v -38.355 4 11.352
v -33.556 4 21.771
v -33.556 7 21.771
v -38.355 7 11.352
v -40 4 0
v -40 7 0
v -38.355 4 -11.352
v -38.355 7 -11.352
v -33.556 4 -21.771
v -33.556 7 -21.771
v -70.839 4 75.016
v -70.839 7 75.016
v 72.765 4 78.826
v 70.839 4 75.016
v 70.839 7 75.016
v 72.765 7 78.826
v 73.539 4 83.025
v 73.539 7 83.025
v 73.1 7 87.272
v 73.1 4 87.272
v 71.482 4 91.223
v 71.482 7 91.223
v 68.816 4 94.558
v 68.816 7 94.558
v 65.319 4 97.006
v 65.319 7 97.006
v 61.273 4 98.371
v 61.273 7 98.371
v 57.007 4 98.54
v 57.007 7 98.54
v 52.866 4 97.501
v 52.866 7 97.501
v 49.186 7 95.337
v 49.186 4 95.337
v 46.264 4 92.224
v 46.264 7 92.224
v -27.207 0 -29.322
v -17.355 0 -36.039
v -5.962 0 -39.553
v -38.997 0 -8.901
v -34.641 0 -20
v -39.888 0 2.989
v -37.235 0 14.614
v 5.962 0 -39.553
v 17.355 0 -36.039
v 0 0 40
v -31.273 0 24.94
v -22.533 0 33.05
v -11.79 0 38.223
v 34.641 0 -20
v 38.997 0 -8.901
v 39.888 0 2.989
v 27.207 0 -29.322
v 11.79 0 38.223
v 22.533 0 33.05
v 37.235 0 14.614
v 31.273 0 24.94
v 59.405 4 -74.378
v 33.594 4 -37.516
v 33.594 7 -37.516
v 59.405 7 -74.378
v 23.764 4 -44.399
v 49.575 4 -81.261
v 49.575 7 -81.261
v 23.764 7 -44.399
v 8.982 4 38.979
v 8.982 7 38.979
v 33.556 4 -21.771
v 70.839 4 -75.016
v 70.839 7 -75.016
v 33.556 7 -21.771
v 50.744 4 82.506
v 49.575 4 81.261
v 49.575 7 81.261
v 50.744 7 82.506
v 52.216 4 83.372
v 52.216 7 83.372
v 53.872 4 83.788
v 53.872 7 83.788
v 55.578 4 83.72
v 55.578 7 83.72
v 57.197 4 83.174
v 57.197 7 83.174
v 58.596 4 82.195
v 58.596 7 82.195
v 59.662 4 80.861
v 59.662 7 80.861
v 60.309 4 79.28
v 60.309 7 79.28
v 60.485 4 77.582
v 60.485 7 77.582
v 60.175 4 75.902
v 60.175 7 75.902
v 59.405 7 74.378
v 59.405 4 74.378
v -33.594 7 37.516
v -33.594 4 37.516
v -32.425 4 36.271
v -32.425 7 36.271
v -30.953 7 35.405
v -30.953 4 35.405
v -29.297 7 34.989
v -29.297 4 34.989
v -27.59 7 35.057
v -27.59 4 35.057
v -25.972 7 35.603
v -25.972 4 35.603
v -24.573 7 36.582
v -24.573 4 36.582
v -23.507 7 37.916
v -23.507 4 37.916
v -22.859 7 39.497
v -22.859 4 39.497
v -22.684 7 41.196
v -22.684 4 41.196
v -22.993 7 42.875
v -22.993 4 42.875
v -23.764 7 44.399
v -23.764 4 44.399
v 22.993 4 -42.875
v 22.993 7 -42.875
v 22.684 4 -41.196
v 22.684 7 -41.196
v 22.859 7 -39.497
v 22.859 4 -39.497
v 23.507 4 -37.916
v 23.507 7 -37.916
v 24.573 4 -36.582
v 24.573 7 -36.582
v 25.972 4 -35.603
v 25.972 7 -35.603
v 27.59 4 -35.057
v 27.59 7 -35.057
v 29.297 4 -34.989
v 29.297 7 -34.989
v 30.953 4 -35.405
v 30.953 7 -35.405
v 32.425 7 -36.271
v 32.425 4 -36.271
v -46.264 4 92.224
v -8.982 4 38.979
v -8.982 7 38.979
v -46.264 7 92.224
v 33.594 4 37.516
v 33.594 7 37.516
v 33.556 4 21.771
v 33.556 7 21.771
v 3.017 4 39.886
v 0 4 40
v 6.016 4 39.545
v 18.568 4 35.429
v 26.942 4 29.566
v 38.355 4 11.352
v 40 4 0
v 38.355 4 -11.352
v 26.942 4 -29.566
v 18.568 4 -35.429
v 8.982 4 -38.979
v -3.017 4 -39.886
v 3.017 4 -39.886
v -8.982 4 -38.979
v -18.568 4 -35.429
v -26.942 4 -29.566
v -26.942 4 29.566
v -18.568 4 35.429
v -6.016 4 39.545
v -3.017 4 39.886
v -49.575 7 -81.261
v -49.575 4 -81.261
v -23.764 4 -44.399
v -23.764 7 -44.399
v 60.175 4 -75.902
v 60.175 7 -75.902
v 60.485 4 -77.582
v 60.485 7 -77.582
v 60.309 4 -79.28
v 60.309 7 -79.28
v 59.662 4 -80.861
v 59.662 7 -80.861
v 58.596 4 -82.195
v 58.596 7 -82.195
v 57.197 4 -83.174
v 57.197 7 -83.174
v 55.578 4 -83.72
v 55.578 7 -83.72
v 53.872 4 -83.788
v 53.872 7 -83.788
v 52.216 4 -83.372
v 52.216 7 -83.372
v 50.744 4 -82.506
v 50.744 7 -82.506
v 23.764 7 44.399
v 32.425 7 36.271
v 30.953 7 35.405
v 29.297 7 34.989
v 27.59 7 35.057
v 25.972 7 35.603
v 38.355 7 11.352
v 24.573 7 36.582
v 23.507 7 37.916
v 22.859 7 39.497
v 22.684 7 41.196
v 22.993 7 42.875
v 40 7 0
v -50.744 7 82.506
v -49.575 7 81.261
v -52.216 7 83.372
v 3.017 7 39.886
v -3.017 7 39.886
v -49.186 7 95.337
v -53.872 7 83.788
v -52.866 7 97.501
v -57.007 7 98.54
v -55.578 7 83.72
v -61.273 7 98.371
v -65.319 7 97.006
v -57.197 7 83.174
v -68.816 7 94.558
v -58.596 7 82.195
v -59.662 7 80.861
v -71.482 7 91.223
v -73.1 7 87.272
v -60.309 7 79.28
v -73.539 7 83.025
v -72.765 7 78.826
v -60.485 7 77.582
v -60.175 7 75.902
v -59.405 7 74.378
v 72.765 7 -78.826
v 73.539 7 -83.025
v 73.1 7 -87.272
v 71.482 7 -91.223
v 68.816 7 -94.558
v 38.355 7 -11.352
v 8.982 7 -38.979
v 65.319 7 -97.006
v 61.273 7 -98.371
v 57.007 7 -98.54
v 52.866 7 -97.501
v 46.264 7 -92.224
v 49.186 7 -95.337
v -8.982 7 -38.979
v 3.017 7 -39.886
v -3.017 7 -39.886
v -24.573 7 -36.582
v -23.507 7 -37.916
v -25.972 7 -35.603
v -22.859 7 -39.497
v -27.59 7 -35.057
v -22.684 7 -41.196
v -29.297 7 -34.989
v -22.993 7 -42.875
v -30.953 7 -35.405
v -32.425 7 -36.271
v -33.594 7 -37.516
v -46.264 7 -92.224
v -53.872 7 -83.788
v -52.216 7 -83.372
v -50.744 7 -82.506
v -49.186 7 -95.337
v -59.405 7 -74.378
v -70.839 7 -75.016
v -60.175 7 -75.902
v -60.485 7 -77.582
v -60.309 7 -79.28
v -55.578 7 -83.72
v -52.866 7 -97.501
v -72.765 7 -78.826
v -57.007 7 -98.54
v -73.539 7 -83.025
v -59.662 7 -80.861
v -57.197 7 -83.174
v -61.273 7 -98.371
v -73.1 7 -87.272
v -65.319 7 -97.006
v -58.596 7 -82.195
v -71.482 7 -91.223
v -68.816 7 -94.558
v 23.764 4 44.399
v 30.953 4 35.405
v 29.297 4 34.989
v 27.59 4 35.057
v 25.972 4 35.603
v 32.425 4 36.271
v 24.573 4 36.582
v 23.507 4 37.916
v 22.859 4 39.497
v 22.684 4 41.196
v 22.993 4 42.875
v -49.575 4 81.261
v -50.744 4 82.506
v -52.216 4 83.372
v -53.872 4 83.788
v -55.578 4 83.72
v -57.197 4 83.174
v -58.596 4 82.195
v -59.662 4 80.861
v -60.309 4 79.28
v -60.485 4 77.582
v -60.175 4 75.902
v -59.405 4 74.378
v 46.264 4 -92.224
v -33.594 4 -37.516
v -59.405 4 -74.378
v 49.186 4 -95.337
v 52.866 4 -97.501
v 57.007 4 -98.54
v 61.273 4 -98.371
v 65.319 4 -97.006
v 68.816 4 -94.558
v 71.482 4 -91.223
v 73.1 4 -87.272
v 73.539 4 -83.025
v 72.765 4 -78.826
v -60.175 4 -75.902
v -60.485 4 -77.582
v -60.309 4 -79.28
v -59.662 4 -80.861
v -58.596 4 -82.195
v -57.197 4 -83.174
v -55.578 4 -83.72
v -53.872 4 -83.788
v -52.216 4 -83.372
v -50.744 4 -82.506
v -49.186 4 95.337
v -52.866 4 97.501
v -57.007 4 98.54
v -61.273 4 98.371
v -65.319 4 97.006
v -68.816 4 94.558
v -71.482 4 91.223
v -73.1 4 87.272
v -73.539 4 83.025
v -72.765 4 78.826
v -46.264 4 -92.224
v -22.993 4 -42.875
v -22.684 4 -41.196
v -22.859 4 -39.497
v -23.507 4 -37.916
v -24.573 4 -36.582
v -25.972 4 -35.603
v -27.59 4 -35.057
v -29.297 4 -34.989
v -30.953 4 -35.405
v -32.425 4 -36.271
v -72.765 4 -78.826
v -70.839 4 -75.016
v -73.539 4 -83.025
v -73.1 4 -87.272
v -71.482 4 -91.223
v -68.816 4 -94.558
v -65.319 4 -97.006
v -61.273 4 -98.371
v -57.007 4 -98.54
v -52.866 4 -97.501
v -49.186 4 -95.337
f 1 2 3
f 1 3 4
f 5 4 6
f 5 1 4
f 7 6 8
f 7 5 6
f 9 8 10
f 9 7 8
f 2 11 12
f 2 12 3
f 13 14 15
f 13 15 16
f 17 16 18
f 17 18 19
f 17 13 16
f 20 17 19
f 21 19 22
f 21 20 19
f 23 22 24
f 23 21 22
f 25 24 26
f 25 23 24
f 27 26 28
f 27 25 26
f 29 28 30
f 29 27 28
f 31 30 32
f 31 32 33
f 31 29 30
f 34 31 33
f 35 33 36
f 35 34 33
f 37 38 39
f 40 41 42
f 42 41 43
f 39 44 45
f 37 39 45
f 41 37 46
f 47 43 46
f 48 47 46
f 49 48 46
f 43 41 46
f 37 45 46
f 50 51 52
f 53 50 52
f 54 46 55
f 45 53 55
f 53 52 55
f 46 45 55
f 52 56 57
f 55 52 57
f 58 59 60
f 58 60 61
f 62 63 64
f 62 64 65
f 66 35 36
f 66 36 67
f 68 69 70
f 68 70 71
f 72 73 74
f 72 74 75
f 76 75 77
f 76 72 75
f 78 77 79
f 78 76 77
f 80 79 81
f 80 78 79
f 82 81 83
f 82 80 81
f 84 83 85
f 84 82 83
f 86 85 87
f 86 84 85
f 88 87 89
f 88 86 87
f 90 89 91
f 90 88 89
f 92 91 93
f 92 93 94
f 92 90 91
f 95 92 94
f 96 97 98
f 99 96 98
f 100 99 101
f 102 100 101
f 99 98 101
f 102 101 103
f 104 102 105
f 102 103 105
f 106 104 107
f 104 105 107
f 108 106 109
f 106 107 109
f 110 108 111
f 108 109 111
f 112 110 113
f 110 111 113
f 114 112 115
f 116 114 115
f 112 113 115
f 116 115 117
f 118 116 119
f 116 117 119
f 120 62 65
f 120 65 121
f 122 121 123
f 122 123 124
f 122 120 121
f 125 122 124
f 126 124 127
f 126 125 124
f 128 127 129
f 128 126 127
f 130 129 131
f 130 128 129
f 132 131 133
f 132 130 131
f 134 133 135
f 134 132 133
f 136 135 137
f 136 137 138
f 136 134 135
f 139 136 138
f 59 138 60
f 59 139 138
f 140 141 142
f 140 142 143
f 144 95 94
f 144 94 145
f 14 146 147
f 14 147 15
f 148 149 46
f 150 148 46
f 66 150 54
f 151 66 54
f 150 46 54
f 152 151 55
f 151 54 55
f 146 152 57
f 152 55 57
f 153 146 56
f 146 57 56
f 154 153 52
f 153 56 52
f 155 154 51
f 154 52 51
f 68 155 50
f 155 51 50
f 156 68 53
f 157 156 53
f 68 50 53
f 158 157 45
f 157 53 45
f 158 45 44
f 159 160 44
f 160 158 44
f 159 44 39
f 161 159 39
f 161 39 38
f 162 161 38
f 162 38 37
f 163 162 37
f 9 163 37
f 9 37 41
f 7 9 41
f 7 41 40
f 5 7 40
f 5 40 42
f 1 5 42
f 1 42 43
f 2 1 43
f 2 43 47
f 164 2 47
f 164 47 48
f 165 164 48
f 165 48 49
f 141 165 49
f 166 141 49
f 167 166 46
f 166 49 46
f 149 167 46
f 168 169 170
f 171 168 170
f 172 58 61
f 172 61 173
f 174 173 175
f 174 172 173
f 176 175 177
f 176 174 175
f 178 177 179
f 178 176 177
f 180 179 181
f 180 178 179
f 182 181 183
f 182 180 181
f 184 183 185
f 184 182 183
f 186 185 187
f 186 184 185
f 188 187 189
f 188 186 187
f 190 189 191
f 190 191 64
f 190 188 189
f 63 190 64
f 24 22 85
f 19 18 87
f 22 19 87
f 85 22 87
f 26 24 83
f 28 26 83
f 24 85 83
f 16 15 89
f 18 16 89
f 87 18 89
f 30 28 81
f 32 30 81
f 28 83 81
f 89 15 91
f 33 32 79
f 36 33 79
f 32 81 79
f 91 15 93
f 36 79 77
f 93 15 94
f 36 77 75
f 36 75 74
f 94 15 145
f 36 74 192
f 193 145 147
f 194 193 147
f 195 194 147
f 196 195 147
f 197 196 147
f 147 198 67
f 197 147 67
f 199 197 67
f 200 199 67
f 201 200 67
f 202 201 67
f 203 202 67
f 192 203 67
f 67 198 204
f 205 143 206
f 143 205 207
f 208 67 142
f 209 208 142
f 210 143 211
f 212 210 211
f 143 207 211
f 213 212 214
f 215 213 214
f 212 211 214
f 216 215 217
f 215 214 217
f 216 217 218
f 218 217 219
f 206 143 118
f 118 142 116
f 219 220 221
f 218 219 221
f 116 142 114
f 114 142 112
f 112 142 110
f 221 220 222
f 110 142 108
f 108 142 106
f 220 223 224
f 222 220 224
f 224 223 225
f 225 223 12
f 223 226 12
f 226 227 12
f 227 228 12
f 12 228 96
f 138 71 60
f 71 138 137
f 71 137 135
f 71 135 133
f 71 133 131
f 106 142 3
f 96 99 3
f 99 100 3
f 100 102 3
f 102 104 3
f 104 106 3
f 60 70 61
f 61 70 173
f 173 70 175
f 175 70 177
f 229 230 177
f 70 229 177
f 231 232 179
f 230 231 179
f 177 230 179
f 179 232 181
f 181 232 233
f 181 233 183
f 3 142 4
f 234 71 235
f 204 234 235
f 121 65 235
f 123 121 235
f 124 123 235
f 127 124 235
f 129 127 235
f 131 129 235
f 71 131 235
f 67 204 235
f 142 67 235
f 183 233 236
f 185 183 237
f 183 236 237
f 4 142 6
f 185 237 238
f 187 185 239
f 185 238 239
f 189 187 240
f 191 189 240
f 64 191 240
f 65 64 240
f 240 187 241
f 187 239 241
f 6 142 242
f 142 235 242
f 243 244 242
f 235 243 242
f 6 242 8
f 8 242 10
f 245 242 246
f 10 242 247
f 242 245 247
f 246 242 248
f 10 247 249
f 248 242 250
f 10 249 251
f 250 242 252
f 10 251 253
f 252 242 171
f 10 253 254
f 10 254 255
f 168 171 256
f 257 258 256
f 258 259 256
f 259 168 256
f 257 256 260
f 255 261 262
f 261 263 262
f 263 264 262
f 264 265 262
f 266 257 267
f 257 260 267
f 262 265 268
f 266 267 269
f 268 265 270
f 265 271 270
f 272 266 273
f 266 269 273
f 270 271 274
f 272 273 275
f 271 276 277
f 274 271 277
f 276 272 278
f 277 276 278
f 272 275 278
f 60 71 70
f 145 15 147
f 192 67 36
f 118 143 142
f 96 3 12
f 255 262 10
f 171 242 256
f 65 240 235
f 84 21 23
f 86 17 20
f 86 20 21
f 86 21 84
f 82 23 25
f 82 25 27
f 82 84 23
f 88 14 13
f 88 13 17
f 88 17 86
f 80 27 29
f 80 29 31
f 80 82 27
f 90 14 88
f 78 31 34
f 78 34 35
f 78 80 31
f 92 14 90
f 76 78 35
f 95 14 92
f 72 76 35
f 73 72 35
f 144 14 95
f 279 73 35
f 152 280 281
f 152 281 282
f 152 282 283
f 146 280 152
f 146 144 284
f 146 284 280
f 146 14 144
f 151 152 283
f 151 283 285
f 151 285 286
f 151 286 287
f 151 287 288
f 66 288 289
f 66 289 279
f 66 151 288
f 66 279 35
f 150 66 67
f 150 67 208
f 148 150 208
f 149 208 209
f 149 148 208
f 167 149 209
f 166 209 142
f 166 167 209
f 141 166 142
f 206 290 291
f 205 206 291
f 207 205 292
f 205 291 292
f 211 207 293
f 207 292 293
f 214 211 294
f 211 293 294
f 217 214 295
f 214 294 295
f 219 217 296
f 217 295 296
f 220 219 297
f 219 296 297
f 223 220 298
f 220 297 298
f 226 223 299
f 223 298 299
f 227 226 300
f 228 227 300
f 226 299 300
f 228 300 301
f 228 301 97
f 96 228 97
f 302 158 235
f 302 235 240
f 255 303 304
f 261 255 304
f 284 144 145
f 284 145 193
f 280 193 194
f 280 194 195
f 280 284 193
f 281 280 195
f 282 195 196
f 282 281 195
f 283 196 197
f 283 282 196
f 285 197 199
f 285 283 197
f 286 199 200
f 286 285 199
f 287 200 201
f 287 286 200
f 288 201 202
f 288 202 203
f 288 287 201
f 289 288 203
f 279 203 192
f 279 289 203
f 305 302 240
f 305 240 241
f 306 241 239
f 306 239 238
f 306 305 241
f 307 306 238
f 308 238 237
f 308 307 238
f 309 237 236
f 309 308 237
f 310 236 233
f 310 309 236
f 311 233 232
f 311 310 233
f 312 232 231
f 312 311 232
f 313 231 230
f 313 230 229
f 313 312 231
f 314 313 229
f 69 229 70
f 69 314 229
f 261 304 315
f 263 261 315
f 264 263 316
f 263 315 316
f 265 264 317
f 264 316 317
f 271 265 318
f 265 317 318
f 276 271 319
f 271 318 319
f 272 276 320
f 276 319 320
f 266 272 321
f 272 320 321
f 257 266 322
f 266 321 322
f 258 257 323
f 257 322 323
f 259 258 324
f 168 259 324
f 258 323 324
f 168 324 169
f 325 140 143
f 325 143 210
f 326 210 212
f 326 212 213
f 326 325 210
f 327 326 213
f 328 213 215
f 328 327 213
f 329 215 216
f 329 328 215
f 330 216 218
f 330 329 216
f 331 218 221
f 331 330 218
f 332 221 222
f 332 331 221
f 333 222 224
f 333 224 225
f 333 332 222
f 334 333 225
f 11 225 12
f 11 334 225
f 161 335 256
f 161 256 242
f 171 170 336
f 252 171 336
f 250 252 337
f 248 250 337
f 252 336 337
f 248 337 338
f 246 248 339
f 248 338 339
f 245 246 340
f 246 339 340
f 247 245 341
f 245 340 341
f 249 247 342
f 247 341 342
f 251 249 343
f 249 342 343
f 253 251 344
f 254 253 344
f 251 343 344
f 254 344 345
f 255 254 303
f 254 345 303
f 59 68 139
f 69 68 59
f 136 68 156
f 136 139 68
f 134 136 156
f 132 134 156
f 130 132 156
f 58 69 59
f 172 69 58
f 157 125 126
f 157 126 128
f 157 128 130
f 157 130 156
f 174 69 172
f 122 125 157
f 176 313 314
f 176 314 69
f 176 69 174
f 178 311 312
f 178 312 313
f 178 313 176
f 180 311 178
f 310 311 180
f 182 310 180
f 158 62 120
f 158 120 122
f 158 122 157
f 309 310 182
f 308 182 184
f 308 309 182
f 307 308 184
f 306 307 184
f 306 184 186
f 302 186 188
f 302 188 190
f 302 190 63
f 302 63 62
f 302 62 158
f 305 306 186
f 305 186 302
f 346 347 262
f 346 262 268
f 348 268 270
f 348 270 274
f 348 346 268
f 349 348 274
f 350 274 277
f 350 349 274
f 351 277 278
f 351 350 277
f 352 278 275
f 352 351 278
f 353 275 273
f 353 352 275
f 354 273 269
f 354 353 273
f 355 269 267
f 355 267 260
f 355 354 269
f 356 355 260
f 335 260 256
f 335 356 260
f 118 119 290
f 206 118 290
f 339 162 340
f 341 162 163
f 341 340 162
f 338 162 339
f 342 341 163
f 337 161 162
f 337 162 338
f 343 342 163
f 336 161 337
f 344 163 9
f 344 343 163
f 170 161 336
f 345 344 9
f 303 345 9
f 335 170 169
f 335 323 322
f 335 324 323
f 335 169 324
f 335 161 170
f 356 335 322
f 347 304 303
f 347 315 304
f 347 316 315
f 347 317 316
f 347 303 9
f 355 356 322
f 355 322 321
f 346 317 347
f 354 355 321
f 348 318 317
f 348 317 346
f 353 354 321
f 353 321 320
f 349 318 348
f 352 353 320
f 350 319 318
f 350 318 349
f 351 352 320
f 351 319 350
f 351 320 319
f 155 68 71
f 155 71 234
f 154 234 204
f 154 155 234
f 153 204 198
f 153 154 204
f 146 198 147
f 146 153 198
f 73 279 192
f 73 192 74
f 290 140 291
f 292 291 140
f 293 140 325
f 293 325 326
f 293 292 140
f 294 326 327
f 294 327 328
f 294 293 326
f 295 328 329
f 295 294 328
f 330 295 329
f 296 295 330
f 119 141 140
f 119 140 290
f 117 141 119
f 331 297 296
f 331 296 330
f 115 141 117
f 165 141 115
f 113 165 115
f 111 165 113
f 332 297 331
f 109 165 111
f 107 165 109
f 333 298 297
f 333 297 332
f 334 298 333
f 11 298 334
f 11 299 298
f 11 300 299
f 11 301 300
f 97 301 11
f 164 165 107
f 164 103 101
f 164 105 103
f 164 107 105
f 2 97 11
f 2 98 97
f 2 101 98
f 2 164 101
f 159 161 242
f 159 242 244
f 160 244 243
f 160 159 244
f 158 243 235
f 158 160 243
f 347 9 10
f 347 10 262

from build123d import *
from build123d.topology import SkipClean

# Parameters (mm, degrees)
SKETCH1_R           = 40
BOSS_EXTRUDE1_DEPTH = 4
BOSS_EXTRUDE2_DEPTH = 3
CUT_EXTRUDE1_DEPTH  = 3


with BuildPart() as part:
    # Sketch1 → Boss-Extrude1 (new body)
    with BuildSketch(Plane(origin=(0, 0, 0), x_dir=(1, 0, 0), z_dir=(0, 1, 0))):
        with Locations(Location((0, 0, 0), (0, 0, 270))):
            Circle(SKETCH1_R)
    extrude(amount=BOSS_EXTRUDE1_DEPTH)

    # Sketch2 → Boss-Extrude2 (add)
    with SkipClean():  # the faces are left unmerged after this step: merging them gives an invalid solid
        with BuildSketch(Plane(origin=(0, 4, 0), x_dir=(1, 0, 0), z_dir=(0, 1, 0))):
            with BuildLine():
                Line((70.838532525, 75.016207091), (33.556064162, 21.771324213))
                ThreePointArc((33.556064162, 21.771324213), (40, 0), (33.556064162, -21.771324213))
                Line((33.556064162, -21.771324213), (70.838532525, -75.016207091))
                ThreePointArc((70.838532525, -75.016207091), (67.154898406, -95.907134301), (46.263971196, -92.223500182))
                Line((46.263971196, -92.223500182), (8.981502833, -38.978617303))
                ThreePointArc((8.981502833, -38.978617303), (0, -40), (-8.981502833, -38.978617303))
                Line((-8.981502833, -38.978617303), (-46.263971196, -92.223500182))
                ThreePointArc((-46.263971196, -92.223500182), (-67.154898406, -95.907134301), (-70.838532525, -75.016207091))
                Line((-70.838532525, -75.016207091), (-33.556064162, -21.771324213))
                ThreePointArc((-33.556064162, -21.771324213), (-40, 0), (-33.556064162, 21.771324213))
                Line((-33.556064162, 21.771324213), (-70.838532525, 75.016207091))
                ThreePointArc((-70.838532525, 75.016207091), (-67.154898406, 95.907134301), (-46.263971196, 92.223500182))
                Line((-46.263971196, 92.223500182), (-8.981502833, 38.978617303))
                ThreePointArc((-8.981502833, 38.978617303), (0, 40), (8.981502833, 38.978617303))
                Line((8.981502833, 38.978617303), (46.263971196, 92.223500182))
                ThreePointArc((46.263971196, 92.223500182), (67.154898406, 95.907134301), (70.838532525, 75.016207091))
            make_face()
        extrude(amount=BOSS_EXTRUDE2_DEPTH)

    # Sketch3 → Cut-Extrude1 (cut)
    with SkipClean():  # the faces are left unmerged after this step: merging them gives an invalid solid
        with BuildSketch(Plane.XZ.offset(-4)):
            with BuildLine():
                Line((33.593734083, -37.516143596), (59.404673719, -74.377985589))
                ThreePointArc((59.404673719, -74.377985589), (57.931220071, -82.734356473), (49.574849188, -81.260902826))
                Line((49.574849188, -81.260902826), (23.763909552, -44.399060833))
                ThreePointArc((23.763909552, -44.399060833), (25.237363199, -36.042689949), (33.593734083, -37.516143596))
            make_face()
            with BuildLine():
                Line((-33.593734083, -37.516143596), (-59.404673719, -74.377985589))
                ThreePointArc((-59.404673719, -74.377985589), (-57.931220071, -82.734356473), (-49.574849188, -81.260902826))
                Line((-49.574849188, -81.260902826), (-23.763909552, -44.399060833))
                ThreePointArc((-23.763909552, -44.399060833), (-25.237363199, -36.042689949), (-33.593734083, -37.516143596))
            make_face()
            with BuildLine():
                Line((23.763909552, 44.399060833), (49.574849188, 81.260902826))
                ThreePointArc((49.574849188, 81.260902826), (57.931220071, 82.734356473), (59.404673719, 74.377985589))
                Line((59.404673719, 74.377985589), (33.593734083, 37.516143596))
                ThreePointArc((33.593734083, 37.516143596), (25.237363199, 36.042689949), (23.763909552, 44.399060833))
            make_face()
            with BuildLine():
                Line((-23.763909552, 44.399060833), (-49.574849188, 81.260902826))
                ThreePointArc((-49.574849188, 81.260902826), (-57.931220071, 82.734356473), (-59.404673719, 74.377985589))
                Line((-59.404673719, 74.377985589), (-33.593734083, 37.516143596))
                ThreePointArc((-33.593734083, 37.516143596), (-25.237363199, 36.042689949), (-23.763909552, 44.399060833))
            make_face()
        extrude(amount=-CUT_EXTRUDE1_DEPTH, mode=Mode.SUBTRACT)


solid = part.part
